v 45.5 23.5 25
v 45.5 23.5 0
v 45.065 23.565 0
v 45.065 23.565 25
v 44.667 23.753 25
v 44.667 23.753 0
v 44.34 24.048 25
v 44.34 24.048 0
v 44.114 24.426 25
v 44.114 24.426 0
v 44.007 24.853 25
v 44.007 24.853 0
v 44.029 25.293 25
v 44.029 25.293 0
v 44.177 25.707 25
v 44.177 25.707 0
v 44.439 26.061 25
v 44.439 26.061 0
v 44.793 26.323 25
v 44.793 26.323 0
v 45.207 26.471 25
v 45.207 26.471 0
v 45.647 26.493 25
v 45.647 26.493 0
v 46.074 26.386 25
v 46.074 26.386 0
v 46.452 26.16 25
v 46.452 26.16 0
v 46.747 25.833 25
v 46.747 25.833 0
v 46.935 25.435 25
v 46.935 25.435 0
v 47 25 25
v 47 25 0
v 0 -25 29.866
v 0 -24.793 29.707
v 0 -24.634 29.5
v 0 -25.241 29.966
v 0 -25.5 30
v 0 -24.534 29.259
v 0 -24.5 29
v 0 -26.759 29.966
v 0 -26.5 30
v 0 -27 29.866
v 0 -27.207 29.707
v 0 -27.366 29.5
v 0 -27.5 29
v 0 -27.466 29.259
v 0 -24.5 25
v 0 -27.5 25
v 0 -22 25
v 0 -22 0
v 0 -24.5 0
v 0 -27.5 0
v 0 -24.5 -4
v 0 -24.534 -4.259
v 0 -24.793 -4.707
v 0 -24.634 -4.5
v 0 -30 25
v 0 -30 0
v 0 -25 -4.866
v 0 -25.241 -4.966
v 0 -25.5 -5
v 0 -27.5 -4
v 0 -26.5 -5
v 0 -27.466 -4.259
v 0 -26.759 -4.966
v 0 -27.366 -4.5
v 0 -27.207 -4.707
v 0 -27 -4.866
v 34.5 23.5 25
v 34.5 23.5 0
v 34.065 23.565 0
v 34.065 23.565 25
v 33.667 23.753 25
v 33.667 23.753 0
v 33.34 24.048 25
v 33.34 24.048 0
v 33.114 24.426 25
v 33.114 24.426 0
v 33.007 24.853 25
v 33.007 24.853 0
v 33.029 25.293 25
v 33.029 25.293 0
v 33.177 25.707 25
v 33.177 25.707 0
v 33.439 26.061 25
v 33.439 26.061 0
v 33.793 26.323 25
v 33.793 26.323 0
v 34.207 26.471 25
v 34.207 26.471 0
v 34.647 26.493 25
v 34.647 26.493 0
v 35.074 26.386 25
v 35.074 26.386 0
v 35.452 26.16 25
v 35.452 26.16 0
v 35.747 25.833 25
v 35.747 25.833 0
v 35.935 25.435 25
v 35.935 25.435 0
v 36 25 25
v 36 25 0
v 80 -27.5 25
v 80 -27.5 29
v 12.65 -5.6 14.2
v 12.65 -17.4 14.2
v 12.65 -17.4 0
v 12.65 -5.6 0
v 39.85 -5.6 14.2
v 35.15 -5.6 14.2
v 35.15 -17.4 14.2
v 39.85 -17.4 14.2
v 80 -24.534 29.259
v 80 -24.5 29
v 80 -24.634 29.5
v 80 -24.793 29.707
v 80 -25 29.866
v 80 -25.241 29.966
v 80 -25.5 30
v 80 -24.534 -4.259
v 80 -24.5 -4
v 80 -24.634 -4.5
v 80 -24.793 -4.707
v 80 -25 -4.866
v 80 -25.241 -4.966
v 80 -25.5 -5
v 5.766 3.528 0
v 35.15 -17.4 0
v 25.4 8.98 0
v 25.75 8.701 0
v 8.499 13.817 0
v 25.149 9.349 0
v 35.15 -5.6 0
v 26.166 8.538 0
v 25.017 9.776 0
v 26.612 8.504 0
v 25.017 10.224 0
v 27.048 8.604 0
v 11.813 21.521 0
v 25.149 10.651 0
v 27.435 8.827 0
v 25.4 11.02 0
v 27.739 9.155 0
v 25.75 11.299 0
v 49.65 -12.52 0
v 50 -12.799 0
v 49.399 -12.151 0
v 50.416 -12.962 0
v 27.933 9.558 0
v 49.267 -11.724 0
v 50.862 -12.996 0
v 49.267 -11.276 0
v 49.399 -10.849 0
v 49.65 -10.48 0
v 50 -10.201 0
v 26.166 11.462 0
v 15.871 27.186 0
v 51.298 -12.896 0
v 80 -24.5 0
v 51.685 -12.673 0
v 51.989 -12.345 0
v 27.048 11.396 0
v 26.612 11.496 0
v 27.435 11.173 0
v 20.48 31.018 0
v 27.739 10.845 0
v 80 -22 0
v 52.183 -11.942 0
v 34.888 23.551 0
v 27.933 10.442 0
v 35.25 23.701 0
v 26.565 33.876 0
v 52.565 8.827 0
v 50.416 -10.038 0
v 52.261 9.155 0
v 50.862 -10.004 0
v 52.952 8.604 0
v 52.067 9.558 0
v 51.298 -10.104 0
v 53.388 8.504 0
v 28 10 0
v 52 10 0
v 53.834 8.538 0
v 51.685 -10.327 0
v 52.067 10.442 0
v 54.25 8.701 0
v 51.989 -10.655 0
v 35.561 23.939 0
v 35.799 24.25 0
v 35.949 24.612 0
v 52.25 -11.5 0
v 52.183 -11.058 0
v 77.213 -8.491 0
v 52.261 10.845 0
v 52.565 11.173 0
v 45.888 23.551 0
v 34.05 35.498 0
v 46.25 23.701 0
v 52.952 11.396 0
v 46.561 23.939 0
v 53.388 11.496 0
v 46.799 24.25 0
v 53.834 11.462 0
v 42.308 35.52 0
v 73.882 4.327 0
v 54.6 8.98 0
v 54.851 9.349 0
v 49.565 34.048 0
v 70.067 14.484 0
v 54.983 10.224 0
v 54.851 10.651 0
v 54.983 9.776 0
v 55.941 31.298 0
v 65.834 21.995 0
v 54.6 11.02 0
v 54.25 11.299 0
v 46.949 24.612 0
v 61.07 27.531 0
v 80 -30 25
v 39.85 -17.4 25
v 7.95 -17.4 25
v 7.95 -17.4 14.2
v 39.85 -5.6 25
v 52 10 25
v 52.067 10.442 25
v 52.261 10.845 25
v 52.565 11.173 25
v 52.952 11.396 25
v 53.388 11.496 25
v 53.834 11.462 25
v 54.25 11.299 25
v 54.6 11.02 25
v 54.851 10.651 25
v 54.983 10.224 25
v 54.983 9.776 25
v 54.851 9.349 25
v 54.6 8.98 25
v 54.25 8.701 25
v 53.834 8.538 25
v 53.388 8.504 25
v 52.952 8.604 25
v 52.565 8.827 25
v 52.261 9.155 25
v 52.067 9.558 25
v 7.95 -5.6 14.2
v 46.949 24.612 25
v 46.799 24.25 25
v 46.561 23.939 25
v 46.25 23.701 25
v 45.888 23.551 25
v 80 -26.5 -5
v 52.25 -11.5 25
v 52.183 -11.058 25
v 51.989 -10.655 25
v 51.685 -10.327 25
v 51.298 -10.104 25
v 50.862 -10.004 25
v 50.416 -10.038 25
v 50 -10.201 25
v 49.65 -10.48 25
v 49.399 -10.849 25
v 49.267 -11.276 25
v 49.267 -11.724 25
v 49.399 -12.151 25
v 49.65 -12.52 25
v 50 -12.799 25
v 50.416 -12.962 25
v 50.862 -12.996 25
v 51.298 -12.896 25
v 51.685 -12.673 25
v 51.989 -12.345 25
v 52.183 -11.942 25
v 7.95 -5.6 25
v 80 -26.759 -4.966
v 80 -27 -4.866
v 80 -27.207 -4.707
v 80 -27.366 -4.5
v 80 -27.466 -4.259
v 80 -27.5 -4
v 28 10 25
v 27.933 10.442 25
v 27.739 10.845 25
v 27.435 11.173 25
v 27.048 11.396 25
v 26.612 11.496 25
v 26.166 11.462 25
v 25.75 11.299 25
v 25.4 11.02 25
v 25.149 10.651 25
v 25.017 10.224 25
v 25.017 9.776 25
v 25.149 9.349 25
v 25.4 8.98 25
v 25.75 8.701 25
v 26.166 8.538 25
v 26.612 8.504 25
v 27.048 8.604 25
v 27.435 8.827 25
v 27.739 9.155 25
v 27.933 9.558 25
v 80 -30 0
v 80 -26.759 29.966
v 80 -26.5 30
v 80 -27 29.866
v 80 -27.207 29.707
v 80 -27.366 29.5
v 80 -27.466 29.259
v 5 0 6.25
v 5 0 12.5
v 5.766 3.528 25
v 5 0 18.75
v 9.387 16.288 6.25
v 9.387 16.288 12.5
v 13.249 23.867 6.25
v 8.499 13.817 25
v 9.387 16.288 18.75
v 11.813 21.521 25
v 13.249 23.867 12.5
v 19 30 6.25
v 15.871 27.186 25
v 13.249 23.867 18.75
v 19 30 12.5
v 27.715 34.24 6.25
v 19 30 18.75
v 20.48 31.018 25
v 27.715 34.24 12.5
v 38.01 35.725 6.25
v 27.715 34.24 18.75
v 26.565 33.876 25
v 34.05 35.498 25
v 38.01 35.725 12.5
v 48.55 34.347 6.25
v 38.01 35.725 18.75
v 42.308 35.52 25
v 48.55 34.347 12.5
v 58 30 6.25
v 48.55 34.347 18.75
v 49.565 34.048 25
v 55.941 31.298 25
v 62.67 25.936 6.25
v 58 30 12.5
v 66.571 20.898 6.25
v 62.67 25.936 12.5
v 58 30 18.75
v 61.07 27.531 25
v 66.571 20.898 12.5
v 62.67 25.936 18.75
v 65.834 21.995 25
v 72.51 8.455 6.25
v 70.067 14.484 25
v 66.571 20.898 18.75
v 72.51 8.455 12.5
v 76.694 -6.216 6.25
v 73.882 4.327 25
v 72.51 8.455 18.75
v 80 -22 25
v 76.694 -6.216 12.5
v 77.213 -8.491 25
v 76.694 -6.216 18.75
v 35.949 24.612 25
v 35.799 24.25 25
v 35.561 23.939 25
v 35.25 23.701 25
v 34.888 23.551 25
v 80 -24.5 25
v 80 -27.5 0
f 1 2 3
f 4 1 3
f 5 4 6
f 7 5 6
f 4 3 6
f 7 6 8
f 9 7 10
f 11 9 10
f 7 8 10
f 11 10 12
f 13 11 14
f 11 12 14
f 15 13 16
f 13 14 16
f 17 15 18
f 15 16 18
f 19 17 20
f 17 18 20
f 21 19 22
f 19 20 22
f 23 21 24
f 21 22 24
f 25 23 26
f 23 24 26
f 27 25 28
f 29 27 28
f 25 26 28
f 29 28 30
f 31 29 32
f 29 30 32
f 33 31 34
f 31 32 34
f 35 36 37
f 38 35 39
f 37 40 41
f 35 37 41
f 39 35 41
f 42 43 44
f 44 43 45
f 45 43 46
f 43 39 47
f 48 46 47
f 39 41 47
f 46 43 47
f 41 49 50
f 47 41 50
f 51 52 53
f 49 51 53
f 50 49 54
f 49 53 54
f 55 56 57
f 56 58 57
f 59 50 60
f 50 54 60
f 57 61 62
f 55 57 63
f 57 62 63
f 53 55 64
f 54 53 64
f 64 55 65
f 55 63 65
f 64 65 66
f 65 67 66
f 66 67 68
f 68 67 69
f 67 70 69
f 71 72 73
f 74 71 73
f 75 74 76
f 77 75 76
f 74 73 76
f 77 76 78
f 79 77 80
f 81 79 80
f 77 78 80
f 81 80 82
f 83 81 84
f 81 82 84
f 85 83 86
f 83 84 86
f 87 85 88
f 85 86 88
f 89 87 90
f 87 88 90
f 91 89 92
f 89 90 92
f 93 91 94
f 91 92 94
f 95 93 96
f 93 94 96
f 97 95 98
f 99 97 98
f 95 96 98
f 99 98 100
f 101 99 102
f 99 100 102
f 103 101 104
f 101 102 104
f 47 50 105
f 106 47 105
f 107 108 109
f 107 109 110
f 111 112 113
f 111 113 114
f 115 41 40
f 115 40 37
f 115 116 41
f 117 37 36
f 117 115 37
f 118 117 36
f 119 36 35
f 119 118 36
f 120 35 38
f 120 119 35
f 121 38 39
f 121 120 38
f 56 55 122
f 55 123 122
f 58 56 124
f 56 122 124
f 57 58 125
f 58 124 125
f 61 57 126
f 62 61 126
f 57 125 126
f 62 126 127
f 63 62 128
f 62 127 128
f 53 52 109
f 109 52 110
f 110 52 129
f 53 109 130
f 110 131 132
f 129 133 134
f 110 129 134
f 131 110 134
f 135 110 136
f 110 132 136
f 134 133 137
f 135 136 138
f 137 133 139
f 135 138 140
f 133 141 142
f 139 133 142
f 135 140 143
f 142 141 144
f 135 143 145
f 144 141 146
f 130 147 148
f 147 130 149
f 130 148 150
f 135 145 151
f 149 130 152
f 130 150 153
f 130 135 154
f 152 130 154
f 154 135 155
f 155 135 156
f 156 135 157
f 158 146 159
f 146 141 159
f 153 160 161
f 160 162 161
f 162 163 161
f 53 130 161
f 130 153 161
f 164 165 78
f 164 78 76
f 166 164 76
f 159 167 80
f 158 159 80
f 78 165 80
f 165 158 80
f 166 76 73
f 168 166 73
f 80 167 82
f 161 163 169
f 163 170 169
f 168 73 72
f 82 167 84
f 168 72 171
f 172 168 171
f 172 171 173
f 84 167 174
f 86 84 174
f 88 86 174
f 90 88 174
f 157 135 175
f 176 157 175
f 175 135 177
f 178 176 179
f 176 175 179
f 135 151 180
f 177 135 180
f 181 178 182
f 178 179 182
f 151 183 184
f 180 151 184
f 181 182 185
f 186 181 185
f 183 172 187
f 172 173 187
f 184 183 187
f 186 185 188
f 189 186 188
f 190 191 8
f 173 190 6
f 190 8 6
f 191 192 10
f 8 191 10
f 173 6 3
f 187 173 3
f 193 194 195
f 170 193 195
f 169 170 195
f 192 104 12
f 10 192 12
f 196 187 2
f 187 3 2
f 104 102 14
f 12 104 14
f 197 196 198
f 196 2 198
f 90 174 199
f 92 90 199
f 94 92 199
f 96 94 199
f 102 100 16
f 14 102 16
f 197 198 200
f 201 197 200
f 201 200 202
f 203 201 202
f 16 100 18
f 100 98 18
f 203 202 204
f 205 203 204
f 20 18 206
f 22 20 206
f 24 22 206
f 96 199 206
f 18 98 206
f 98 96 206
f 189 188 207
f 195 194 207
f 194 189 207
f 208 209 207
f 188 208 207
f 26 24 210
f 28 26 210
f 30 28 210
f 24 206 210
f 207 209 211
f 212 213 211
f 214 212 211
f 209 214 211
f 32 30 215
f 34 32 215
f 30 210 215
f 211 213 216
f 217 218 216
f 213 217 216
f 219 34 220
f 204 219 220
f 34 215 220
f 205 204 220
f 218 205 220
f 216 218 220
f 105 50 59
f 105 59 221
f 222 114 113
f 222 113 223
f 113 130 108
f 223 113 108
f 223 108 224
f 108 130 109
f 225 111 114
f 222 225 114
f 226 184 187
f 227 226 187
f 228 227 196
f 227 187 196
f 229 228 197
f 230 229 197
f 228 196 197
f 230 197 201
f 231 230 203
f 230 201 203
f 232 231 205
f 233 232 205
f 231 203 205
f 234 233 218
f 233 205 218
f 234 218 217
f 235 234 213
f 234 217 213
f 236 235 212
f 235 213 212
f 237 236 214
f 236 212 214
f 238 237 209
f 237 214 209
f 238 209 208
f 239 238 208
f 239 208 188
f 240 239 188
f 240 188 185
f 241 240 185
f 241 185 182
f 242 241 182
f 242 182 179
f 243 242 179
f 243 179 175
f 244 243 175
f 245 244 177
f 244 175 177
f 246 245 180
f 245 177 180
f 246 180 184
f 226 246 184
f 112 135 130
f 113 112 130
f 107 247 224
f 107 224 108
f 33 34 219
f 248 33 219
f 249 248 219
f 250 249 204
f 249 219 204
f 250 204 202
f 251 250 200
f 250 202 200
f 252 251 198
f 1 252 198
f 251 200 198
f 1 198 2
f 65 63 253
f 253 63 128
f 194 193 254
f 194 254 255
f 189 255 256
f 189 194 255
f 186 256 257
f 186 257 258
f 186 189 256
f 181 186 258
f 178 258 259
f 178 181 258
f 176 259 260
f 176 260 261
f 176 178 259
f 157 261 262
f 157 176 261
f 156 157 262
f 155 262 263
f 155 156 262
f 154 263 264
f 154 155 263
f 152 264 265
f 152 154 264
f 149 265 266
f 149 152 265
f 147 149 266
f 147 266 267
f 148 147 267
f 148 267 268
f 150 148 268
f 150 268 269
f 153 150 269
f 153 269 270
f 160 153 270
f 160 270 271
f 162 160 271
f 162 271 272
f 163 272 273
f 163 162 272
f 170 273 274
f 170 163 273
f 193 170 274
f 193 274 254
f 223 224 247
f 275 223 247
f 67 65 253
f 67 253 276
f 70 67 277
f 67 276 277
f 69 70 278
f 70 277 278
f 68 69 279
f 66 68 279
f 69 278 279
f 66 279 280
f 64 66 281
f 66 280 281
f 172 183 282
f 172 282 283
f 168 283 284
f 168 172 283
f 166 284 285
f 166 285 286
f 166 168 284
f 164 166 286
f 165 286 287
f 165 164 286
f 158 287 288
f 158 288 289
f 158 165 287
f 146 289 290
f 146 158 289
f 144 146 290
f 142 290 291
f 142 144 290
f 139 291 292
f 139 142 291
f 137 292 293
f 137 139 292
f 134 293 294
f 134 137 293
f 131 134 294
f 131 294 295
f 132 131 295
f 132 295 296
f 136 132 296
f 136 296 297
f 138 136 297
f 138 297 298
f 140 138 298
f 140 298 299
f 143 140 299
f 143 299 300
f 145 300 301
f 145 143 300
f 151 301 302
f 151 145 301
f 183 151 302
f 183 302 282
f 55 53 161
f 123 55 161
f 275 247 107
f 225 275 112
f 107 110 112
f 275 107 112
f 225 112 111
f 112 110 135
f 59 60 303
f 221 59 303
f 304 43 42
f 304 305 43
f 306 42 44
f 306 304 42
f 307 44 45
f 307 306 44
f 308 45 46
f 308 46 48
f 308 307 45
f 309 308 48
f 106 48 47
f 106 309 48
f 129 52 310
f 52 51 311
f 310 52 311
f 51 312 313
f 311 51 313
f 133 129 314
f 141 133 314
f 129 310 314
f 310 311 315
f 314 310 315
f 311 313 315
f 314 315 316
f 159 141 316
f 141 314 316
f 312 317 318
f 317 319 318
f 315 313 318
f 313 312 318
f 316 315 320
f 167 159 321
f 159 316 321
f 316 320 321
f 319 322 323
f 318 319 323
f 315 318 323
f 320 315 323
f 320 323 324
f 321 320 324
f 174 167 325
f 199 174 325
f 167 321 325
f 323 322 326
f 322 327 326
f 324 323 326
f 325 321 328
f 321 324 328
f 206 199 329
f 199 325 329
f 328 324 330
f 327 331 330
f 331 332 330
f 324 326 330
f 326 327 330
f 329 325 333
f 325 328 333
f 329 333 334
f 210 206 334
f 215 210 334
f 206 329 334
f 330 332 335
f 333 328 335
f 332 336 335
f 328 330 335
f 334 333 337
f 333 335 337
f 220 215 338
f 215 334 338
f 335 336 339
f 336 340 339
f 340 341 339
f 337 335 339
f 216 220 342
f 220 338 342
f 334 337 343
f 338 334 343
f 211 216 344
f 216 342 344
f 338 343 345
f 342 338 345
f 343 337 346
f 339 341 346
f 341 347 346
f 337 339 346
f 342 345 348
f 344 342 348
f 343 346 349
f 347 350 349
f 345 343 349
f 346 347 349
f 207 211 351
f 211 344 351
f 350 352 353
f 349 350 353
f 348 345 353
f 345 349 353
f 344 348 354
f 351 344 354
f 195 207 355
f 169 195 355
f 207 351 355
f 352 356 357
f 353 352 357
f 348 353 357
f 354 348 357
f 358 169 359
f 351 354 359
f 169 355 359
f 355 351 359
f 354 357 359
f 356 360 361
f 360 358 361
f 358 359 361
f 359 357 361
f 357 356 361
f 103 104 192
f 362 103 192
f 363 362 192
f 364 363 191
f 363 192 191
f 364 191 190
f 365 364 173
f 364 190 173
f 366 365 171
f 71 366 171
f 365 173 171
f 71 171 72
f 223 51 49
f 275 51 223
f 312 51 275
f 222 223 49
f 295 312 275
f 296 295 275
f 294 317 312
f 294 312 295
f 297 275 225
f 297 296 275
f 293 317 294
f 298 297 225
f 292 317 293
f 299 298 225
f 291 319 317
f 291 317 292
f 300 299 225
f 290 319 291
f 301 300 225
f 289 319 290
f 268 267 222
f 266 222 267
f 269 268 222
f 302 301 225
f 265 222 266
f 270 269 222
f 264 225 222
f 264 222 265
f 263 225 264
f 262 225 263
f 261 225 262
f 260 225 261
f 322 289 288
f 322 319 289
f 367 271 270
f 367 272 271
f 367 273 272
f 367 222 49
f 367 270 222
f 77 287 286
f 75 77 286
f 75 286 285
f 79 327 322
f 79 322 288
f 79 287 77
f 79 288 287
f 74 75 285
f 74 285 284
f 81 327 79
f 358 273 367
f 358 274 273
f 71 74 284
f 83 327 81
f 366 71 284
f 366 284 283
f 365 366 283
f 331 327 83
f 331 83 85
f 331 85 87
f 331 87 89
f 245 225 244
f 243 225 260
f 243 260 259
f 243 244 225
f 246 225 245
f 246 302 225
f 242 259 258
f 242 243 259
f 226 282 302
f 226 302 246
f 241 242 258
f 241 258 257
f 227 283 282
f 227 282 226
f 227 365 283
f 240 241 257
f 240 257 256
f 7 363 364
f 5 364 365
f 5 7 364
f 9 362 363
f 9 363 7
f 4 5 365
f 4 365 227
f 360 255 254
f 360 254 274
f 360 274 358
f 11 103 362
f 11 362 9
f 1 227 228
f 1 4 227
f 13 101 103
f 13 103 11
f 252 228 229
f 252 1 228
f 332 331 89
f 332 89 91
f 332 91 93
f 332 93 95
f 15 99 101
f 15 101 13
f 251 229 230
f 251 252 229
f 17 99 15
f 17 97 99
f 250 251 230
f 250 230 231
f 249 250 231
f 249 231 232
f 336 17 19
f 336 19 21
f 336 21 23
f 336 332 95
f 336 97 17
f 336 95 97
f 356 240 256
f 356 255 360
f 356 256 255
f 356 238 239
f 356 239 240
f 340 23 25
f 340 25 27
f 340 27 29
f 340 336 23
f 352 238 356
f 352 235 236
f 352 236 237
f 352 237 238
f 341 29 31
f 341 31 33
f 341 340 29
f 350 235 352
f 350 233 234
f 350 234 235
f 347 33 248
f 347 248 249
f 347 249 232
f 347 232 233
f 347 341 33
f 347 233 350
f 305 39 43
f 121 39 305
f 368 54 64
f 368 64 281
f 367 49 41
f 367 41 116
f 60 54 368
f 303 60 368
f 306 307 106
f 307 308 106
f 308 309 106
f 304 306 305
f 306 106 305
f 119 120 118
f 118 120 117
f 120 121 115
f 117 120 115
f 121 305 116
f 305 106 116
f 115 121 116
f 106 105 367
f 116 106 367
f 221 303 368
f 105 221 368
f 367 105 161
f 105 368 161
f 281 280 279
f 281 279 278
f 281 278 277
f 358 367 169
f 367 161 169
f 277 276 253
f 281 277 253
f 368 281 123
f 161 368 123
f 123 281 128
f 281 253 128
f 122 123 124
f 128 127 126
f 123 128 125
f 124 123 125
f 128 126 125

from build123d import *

# Parameters (mm, degrees)
F0_R     = 1.5
F1_DEPTH = 25
F2_DEPTH = 25
F0_W     = 4.7
F0_H     = 11.8
F0_H_2   = 5.9
F3_DEPTH = 14.2
F5_DEPTH = 25
F4_W     = 80
F4_H     = 3
F6_DEPTH = 5
F7_DEPTH = 35
F8_R     = 1


with BuildPart() as f1:
    # F0 (on Top) → F1 (new body)
    with BuildSketch(Plane.XY):
        Polygon((0, 40), (0, 0), (40, 0), (80, 0), (80, 40), align=None)
        with Locations((26.5, 10)):
            Circle(F0_R, mode=Mode.SUBTRACT)
        with BuildLine():
            ThreePointArc((36, 25), (35.5606601718, 23.9393398282), (34.5, 23.5))
            ThreePointArc((34.5, 23.5), (33.4393398282, 26.0606601718), (36, 25))
        make_face(mode=Mode.SUBTRACT)
        with BuildLine():
            ThreePointArc((55, 10), (53.5, 8.5), (52, 10))
            ThreePointArc((52, 10), (53.5, 11.5), (55, 10))
        make_face(mode=Mode.SUBTRACT)
        with BuildLine():
            ThreePointArc((47, 25), (46.5606601718, 23.9393398282), (45.5, 23.5))
            ThreePointArc((45.5, 23.5), (44.4393398282, 26.0606601718), (47, 25))
        make_face(mode=Mode.SUBTRACT)
    extrude(amount=F1_DEPTH)

    # F0 (on Top) → F2 (join)
    with BuildSketch(Plane.XY):
        Polygon((40, 0), (0, 0), (0, -30), (80, -30), (80, 0), align=None)
        Polygon((39.85, -5.6), (39.85, -11.5), (39.85, -17.4), (35.15, -17.4), (12.65, -17.4), (7.95, -17.4), (7.95, -5.6), (12.65, -5.6), (35.15, -5.6), align=None, mode=Mode.SUBTRACT)
        with Locations((50.75, -11.5)):
            Circle(F0_R, mode=Mode.SUBTRACT)
    extrude(amount=F2_DEPTH)

    # F0 (on Top) → F3 (join)
    with BuildSketch(Plane.XY):
        with Locations((10.3, -11.5)):
            Rectangle(F0_W, F0_H)
        with Locations((37.5, -8.55)):
            Rectangle(F0_W, F0_H_2)
        with Locations((37.5, -14.45)):
            Rectangle(F0_W, F0_H_2)
    extrude(amount=F3_DEPTH)

    # F4 (on face) → F5 (cut)
    with BuildSketch(Plane.XY.offset(25)):
        with BuildLine():
            add(Edge.make_bspline(
                [(0, -22), (1.5830030705, -15.2480369582), (5.0835925822, -0.3170166418), (12.6225982047, 37.0911590405), (68.0718145624, 38.2827382441), (75.786729565, -0.7069474975), (80, -22)],
                knots=[0, 0, 0, 0, 0.1957668902, 0.4329110507, 0.6903013055, 1, 1, 1, 1], degree=3))
            Line((80, -22), (80, 40))
            Line((80, 40), (0, 40))
            Line((0, 40), (0, -22))
        make_face()
    extrude(amount=-F5_DEPTH, mode=Mode.SUBTRACT)

    # F4 (on face) → F6 (join)
    with BuildSketch(Plane.XY.offset(25)):
        with Locations((40, -26)):
            Rectangle(F4_W, F4_H)
    extrude(amount=F6_DEPTH)

    # F7 (add): a face of the model
    f7_faces = [f1.faces().sort_by_distance(p)[0] for p in [
        (40, -26, 30),
    ]]
    extrude(f7_faces, amount=-F7_DEPTH)

    # F8
    f8_edges = [f1.edges().sort_by_distance(p)[0] for p in [
        (40, -24.5, 30),
        (40, -27.5, 30),
        (40, -24.5, -5),
        (40, -27.5, -5),
    ]]
    fillet(f8_edges, radius=F8_R)


solid = f1.part
